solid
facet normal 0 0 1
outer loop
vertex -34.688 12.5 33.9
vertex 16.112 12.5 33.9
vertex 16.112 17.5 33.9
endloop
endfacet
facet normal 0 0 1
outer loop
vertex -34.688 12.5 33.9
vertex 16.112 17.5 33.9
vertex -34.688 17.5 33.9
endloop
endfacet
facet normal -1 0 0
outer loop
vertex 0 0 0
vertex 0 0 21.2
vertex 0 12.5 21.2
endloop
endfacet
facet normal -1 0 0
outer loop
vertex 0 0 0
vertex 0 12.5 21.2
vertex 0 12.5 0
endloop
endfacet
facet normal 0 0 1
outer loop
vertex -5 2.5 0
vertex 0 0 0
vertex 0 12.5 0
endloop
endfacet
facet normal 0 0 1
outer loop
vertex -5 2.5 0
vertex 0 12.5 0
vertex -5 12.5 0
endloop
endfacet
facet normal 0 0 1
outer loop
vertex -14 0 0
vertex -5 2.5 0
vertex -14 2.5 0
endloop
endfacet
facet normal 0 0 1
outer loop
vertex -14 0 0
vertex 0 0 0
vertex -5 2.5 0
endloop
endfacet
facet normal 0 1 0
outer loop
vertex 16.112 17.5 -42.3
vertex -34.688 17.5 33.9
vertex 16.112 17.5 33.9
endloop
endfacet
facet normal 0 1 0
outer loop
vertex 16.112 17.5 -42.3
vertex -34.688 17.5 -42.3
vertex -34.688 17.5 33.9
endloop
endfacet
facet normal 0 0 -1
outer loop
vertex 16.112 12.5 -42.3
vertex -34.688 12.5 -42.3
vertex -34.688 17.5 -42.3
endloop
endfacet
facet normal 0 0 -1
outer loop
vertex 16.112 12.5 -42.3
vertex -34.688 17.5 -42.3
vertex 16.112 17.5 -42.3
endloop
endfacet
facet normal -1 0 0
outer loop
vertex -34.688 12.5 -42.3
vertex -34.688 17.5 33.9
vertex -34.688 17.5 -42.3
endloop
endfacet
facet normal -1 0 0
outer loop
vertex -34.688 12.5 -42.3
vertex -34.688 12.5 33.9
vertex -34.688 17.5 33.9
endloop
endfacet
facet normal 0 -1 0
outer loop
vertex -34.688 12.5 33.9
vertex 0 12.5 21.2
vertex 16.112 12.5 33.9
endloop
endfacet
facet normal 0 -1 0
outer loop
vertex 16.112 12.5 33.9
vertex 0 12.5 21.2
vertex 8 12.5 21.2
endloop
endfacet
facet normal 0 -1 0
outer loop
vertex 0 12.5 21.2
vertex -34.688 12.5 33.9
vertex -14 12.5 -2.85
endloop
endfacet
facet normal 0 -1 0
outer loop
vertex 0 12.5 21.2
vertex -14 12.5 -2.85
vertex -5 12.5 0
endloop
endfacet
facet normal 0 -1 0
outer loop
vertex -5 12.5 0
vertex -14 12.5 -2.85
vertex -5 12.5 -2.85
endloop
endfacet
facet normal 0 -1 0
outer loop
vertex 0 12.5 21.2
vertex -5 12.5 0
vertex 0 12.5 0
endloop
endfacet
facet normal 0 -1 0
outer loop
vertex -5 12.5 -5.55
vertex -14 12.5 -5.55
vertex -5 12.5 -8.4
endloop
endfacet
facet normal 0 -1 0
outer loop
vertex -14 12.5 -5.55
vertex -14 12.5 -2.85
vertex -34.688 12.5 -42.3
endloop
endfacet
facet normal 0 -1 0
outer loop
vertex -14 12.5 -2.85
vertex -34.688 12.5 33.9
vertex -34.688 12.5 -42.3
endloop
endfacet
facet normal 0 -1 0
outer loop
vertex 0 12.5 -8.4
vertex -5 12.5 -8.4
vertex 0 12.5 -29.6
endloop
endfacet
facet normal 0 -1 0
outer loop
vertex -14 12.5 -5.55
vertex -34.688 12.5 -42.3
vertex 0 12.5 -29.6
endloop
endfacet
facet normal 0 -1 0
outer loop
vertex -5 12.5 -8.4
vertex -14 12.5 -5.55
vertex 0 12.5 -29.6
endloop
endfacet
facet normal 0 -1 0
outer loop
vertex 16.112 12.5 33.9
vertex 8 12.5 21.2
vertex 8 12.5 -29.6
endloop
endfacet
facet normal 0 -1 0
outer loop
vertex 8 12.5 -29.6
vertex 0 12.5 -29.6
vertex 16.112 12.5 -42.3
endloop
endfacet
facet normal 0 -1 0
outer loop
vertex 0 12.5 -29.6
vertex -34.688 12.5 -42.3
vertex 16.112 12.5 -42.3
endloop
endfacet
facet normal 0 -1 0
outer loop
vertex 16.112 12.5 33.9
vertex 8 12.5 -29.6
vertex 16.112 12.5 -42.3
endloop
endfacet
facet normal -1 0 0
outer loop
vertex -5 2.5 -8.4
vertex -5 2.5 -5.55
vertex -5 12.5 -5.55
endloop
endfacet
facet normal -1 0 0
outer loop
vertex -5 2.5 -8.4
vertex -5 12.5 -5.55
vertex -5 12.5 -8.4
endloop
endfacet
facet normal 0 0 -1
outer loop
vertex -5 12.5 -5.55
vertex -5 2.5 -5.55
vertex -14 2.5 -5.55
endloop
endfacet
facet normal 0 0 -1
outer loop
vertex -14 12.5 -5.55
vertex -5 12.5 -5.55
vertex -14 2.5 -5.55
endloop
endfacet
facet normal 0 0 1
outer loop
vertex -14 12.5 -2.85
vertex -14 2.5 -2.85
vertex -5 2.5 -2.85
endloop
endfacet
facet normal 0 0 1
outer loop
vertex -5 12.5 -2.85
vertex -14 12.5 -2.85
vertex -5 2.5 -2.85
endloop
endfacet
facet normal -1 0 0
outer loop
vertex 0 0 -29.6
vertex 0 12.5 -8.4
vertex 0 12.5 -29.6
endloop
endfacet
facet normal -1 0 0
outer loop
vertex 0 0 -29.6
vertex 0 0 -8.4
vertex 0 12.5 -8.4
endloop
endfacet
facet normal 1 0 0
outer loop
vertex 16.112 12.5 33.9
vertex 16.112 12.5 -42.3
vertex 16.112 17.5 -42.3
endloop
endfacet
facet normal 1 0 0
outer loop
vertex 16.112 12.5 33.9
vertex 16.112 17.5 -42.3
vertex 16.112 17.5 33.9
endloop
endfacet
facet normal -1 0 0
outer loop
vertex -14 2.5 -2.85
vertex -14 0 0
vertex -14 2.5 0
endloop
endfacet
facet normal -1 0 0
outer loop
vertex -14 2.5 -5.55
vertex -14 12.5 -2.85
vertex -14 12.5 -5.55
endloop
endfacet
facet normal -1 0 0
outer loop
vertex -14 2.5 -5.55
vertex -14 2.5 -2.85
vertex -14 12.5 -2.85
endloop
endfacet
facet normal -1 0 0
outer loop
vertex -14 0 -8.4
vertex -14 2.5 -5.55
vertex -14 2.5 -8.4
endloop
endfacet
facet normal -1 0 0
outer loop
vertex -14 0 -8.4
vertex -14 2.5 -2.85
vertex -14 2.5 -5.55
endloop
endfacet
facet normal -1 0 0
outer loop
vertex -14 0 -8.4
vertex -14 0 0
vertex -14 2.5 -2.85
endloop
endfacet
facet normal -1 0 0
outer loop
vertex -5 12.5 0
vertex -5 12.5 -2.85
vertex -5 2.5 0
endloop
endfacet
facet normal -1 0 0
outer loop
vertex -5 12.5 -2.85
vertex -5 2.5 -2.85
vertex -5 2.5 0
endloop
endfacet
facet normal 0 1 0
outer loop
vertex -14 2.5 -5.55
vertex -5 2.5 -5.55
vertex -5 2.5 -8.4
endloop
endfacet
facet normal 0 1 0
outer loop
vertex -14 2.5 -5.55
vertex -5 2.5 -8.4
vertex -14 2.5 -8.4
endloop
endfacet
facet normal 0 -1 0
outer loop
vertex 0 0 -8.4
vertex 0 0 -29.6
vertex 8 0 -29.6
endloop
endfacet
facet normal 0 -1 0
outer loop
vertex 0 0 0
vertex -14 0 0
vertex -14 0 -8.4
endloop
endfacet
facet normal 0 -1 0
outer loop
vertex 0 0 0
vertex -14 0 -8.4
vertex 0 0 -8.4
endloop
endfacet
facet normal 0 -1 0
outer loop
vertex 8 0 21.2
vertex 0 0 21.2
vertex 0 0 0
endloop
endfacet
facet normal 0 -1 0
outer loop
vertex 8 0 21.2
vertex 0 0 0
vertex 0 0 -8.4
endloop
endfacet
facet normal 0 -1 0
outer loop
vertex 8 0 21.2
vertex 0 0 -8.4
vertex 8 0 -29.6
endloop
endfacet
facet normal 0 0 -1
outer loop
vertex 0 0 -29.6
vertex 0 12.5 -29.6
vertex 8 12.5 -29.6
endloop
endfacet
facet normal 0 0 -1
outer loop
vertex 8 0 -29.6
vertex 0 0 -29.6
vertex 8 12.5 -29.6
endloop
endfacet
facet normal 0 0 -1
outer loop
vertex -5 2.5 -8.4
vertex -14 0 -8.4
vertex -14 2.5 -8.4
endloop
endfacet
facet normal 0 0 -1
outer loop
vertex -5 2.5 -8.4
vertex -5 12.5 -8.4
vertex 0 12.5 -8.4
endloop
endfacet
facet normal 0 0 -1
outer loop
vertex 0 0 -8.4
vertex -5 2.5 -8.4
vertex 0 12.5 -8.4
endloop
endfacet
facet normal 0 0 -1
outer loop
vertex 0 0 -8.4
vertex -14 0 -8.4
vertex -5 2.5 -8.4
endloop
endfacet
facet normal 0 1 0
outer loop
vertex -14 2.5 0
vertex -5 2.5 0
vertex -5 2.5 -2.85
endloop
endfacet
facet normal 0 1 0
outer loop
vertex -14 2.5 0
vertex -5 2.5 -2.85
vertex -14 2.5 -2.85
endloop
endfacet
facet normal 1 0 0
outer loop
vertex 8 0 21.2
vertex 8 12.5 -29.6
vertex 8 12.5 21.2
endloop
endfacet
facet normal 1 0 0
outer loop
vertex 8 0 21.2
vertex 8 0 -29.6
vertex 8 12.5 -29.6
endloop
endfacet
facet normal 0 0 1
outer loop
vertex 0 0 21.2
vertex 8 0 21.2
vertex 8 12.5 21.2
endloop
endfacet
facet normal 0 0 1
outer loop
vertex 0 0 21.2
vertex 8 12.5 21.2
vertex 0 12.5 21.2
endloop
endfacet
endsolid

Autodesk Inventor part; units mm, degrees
ref_plane "YZ Plane" through (0, 0, 0) normal (1, 0, 0) x (0, 1, 0)
ref_plane "XZ Plane" through (0, 0, 0) normal (0, 1, 0) x (-1, 0, 0)
ref_plane "XY Plane" through (0, 0, 0) normal (0, 0, 1) x (1, 0, 0)
sketch "Sketch1" plane through (0, 0, 0) normal (0, 1, 0) x (-1, 0, 0)
  line L0 (0, 0) -> (14, 0)
  line L1 (14, 0) -> (14, -8.4)
  line L2 (14, -8.4) -> (0, -8.4)
  line L3 (0, -8.4) -> (0, 0)
  dimension "d0" = 8.4
  dimension "d1" = 14
extrude "Extrusion1" add sketch "Sketch1" along normal blind 2.5
sketch "Sketch2" plane through (0, 2.5, 0) normal (0, 1, 0) x (1, 0, 0)
  line L0 (-14, 2.85) -> (-5, 2.85)
  line L1 (-5, 5.55) -> (-14, 5.55)
  line L2 (-14, 5.55) -> (-14, 2.85)
  line L3 (-14, 8.4) -> (-14, 0) projected
  line L4 (-5, 2.85) -> (-5, 0)
  line L5 (-14, 0) -> (0, 0) projected
  line L6 (-5, 0) -> (0, 0)
  line L7 (0, 0) -> (0, 8.4) projected
  line L8 (0, 0) -> (0, 8.4)
  line L9 (-5, 5.55) -> (-5, 8.4)
  line L10 (0, 8.4) -> (-14, 8.4) projected
  point P0 (-14, 4.2)
  point P1 (-14, 4.2)
  point P2 (-5, 1.425)
  point P3 (-5, 6.975)
  dimension "d4" = 9
extrude "Extrusion2" add sketch "Sketch2" along normal blind 10 contours L2 L1 L9 L10 L7 L5 L4 L0
sketch "Sketch3" plane through (0, 0, 0) normal (0, -1, 0) x (1, 0, 0)
  line L0 (0, -29.6) -> (8, -29.6)
  line L1 (8, -29.6) -> (8, 21.2)
  line L2 (8, 21.2) -> (0, 21.2)
  line L3 (0, 21.2) -> (0, -29.6)
  line L4 (0, 0) -> (0, -8.4) projected
  point P0 (8, -4.2)
  point P1 (0, -4.2)
  point P2 (0, -4.2)
  dimension "d8" = 50.8
  dimension "d9" = 8
extrude "Extrusion3" add sketch "Sketch3" against normal up to surface (12.5 mm away)
sketch "Sketch4" plane through (0, 12.5, 0) normal (0, 1, 0) x (1, 0, 0)
  line L0 (16.1115, -33.9) -> (-34.6885, -33.9)
  line L1 (-34.6885, -33.9) -> (-34.6885, 42.3)
  line L2 (-34.6885, 42.3) -> (16.1115, 42.3)
  line L3 (16.1115, 42.3) -> (16.1115, -33.9)
  line L4 (8, 29.6) -> (8, -21.2) projected
  point P0 (0, 0)
  point P1 (16.1115, 4.2)
  point P2 (8, 4.2)
  dimension "d12" = 50.8
  dimension "d13" = 76.2
extrude "Extrusion4" add sketch "Sketch4" along normal blind 5
